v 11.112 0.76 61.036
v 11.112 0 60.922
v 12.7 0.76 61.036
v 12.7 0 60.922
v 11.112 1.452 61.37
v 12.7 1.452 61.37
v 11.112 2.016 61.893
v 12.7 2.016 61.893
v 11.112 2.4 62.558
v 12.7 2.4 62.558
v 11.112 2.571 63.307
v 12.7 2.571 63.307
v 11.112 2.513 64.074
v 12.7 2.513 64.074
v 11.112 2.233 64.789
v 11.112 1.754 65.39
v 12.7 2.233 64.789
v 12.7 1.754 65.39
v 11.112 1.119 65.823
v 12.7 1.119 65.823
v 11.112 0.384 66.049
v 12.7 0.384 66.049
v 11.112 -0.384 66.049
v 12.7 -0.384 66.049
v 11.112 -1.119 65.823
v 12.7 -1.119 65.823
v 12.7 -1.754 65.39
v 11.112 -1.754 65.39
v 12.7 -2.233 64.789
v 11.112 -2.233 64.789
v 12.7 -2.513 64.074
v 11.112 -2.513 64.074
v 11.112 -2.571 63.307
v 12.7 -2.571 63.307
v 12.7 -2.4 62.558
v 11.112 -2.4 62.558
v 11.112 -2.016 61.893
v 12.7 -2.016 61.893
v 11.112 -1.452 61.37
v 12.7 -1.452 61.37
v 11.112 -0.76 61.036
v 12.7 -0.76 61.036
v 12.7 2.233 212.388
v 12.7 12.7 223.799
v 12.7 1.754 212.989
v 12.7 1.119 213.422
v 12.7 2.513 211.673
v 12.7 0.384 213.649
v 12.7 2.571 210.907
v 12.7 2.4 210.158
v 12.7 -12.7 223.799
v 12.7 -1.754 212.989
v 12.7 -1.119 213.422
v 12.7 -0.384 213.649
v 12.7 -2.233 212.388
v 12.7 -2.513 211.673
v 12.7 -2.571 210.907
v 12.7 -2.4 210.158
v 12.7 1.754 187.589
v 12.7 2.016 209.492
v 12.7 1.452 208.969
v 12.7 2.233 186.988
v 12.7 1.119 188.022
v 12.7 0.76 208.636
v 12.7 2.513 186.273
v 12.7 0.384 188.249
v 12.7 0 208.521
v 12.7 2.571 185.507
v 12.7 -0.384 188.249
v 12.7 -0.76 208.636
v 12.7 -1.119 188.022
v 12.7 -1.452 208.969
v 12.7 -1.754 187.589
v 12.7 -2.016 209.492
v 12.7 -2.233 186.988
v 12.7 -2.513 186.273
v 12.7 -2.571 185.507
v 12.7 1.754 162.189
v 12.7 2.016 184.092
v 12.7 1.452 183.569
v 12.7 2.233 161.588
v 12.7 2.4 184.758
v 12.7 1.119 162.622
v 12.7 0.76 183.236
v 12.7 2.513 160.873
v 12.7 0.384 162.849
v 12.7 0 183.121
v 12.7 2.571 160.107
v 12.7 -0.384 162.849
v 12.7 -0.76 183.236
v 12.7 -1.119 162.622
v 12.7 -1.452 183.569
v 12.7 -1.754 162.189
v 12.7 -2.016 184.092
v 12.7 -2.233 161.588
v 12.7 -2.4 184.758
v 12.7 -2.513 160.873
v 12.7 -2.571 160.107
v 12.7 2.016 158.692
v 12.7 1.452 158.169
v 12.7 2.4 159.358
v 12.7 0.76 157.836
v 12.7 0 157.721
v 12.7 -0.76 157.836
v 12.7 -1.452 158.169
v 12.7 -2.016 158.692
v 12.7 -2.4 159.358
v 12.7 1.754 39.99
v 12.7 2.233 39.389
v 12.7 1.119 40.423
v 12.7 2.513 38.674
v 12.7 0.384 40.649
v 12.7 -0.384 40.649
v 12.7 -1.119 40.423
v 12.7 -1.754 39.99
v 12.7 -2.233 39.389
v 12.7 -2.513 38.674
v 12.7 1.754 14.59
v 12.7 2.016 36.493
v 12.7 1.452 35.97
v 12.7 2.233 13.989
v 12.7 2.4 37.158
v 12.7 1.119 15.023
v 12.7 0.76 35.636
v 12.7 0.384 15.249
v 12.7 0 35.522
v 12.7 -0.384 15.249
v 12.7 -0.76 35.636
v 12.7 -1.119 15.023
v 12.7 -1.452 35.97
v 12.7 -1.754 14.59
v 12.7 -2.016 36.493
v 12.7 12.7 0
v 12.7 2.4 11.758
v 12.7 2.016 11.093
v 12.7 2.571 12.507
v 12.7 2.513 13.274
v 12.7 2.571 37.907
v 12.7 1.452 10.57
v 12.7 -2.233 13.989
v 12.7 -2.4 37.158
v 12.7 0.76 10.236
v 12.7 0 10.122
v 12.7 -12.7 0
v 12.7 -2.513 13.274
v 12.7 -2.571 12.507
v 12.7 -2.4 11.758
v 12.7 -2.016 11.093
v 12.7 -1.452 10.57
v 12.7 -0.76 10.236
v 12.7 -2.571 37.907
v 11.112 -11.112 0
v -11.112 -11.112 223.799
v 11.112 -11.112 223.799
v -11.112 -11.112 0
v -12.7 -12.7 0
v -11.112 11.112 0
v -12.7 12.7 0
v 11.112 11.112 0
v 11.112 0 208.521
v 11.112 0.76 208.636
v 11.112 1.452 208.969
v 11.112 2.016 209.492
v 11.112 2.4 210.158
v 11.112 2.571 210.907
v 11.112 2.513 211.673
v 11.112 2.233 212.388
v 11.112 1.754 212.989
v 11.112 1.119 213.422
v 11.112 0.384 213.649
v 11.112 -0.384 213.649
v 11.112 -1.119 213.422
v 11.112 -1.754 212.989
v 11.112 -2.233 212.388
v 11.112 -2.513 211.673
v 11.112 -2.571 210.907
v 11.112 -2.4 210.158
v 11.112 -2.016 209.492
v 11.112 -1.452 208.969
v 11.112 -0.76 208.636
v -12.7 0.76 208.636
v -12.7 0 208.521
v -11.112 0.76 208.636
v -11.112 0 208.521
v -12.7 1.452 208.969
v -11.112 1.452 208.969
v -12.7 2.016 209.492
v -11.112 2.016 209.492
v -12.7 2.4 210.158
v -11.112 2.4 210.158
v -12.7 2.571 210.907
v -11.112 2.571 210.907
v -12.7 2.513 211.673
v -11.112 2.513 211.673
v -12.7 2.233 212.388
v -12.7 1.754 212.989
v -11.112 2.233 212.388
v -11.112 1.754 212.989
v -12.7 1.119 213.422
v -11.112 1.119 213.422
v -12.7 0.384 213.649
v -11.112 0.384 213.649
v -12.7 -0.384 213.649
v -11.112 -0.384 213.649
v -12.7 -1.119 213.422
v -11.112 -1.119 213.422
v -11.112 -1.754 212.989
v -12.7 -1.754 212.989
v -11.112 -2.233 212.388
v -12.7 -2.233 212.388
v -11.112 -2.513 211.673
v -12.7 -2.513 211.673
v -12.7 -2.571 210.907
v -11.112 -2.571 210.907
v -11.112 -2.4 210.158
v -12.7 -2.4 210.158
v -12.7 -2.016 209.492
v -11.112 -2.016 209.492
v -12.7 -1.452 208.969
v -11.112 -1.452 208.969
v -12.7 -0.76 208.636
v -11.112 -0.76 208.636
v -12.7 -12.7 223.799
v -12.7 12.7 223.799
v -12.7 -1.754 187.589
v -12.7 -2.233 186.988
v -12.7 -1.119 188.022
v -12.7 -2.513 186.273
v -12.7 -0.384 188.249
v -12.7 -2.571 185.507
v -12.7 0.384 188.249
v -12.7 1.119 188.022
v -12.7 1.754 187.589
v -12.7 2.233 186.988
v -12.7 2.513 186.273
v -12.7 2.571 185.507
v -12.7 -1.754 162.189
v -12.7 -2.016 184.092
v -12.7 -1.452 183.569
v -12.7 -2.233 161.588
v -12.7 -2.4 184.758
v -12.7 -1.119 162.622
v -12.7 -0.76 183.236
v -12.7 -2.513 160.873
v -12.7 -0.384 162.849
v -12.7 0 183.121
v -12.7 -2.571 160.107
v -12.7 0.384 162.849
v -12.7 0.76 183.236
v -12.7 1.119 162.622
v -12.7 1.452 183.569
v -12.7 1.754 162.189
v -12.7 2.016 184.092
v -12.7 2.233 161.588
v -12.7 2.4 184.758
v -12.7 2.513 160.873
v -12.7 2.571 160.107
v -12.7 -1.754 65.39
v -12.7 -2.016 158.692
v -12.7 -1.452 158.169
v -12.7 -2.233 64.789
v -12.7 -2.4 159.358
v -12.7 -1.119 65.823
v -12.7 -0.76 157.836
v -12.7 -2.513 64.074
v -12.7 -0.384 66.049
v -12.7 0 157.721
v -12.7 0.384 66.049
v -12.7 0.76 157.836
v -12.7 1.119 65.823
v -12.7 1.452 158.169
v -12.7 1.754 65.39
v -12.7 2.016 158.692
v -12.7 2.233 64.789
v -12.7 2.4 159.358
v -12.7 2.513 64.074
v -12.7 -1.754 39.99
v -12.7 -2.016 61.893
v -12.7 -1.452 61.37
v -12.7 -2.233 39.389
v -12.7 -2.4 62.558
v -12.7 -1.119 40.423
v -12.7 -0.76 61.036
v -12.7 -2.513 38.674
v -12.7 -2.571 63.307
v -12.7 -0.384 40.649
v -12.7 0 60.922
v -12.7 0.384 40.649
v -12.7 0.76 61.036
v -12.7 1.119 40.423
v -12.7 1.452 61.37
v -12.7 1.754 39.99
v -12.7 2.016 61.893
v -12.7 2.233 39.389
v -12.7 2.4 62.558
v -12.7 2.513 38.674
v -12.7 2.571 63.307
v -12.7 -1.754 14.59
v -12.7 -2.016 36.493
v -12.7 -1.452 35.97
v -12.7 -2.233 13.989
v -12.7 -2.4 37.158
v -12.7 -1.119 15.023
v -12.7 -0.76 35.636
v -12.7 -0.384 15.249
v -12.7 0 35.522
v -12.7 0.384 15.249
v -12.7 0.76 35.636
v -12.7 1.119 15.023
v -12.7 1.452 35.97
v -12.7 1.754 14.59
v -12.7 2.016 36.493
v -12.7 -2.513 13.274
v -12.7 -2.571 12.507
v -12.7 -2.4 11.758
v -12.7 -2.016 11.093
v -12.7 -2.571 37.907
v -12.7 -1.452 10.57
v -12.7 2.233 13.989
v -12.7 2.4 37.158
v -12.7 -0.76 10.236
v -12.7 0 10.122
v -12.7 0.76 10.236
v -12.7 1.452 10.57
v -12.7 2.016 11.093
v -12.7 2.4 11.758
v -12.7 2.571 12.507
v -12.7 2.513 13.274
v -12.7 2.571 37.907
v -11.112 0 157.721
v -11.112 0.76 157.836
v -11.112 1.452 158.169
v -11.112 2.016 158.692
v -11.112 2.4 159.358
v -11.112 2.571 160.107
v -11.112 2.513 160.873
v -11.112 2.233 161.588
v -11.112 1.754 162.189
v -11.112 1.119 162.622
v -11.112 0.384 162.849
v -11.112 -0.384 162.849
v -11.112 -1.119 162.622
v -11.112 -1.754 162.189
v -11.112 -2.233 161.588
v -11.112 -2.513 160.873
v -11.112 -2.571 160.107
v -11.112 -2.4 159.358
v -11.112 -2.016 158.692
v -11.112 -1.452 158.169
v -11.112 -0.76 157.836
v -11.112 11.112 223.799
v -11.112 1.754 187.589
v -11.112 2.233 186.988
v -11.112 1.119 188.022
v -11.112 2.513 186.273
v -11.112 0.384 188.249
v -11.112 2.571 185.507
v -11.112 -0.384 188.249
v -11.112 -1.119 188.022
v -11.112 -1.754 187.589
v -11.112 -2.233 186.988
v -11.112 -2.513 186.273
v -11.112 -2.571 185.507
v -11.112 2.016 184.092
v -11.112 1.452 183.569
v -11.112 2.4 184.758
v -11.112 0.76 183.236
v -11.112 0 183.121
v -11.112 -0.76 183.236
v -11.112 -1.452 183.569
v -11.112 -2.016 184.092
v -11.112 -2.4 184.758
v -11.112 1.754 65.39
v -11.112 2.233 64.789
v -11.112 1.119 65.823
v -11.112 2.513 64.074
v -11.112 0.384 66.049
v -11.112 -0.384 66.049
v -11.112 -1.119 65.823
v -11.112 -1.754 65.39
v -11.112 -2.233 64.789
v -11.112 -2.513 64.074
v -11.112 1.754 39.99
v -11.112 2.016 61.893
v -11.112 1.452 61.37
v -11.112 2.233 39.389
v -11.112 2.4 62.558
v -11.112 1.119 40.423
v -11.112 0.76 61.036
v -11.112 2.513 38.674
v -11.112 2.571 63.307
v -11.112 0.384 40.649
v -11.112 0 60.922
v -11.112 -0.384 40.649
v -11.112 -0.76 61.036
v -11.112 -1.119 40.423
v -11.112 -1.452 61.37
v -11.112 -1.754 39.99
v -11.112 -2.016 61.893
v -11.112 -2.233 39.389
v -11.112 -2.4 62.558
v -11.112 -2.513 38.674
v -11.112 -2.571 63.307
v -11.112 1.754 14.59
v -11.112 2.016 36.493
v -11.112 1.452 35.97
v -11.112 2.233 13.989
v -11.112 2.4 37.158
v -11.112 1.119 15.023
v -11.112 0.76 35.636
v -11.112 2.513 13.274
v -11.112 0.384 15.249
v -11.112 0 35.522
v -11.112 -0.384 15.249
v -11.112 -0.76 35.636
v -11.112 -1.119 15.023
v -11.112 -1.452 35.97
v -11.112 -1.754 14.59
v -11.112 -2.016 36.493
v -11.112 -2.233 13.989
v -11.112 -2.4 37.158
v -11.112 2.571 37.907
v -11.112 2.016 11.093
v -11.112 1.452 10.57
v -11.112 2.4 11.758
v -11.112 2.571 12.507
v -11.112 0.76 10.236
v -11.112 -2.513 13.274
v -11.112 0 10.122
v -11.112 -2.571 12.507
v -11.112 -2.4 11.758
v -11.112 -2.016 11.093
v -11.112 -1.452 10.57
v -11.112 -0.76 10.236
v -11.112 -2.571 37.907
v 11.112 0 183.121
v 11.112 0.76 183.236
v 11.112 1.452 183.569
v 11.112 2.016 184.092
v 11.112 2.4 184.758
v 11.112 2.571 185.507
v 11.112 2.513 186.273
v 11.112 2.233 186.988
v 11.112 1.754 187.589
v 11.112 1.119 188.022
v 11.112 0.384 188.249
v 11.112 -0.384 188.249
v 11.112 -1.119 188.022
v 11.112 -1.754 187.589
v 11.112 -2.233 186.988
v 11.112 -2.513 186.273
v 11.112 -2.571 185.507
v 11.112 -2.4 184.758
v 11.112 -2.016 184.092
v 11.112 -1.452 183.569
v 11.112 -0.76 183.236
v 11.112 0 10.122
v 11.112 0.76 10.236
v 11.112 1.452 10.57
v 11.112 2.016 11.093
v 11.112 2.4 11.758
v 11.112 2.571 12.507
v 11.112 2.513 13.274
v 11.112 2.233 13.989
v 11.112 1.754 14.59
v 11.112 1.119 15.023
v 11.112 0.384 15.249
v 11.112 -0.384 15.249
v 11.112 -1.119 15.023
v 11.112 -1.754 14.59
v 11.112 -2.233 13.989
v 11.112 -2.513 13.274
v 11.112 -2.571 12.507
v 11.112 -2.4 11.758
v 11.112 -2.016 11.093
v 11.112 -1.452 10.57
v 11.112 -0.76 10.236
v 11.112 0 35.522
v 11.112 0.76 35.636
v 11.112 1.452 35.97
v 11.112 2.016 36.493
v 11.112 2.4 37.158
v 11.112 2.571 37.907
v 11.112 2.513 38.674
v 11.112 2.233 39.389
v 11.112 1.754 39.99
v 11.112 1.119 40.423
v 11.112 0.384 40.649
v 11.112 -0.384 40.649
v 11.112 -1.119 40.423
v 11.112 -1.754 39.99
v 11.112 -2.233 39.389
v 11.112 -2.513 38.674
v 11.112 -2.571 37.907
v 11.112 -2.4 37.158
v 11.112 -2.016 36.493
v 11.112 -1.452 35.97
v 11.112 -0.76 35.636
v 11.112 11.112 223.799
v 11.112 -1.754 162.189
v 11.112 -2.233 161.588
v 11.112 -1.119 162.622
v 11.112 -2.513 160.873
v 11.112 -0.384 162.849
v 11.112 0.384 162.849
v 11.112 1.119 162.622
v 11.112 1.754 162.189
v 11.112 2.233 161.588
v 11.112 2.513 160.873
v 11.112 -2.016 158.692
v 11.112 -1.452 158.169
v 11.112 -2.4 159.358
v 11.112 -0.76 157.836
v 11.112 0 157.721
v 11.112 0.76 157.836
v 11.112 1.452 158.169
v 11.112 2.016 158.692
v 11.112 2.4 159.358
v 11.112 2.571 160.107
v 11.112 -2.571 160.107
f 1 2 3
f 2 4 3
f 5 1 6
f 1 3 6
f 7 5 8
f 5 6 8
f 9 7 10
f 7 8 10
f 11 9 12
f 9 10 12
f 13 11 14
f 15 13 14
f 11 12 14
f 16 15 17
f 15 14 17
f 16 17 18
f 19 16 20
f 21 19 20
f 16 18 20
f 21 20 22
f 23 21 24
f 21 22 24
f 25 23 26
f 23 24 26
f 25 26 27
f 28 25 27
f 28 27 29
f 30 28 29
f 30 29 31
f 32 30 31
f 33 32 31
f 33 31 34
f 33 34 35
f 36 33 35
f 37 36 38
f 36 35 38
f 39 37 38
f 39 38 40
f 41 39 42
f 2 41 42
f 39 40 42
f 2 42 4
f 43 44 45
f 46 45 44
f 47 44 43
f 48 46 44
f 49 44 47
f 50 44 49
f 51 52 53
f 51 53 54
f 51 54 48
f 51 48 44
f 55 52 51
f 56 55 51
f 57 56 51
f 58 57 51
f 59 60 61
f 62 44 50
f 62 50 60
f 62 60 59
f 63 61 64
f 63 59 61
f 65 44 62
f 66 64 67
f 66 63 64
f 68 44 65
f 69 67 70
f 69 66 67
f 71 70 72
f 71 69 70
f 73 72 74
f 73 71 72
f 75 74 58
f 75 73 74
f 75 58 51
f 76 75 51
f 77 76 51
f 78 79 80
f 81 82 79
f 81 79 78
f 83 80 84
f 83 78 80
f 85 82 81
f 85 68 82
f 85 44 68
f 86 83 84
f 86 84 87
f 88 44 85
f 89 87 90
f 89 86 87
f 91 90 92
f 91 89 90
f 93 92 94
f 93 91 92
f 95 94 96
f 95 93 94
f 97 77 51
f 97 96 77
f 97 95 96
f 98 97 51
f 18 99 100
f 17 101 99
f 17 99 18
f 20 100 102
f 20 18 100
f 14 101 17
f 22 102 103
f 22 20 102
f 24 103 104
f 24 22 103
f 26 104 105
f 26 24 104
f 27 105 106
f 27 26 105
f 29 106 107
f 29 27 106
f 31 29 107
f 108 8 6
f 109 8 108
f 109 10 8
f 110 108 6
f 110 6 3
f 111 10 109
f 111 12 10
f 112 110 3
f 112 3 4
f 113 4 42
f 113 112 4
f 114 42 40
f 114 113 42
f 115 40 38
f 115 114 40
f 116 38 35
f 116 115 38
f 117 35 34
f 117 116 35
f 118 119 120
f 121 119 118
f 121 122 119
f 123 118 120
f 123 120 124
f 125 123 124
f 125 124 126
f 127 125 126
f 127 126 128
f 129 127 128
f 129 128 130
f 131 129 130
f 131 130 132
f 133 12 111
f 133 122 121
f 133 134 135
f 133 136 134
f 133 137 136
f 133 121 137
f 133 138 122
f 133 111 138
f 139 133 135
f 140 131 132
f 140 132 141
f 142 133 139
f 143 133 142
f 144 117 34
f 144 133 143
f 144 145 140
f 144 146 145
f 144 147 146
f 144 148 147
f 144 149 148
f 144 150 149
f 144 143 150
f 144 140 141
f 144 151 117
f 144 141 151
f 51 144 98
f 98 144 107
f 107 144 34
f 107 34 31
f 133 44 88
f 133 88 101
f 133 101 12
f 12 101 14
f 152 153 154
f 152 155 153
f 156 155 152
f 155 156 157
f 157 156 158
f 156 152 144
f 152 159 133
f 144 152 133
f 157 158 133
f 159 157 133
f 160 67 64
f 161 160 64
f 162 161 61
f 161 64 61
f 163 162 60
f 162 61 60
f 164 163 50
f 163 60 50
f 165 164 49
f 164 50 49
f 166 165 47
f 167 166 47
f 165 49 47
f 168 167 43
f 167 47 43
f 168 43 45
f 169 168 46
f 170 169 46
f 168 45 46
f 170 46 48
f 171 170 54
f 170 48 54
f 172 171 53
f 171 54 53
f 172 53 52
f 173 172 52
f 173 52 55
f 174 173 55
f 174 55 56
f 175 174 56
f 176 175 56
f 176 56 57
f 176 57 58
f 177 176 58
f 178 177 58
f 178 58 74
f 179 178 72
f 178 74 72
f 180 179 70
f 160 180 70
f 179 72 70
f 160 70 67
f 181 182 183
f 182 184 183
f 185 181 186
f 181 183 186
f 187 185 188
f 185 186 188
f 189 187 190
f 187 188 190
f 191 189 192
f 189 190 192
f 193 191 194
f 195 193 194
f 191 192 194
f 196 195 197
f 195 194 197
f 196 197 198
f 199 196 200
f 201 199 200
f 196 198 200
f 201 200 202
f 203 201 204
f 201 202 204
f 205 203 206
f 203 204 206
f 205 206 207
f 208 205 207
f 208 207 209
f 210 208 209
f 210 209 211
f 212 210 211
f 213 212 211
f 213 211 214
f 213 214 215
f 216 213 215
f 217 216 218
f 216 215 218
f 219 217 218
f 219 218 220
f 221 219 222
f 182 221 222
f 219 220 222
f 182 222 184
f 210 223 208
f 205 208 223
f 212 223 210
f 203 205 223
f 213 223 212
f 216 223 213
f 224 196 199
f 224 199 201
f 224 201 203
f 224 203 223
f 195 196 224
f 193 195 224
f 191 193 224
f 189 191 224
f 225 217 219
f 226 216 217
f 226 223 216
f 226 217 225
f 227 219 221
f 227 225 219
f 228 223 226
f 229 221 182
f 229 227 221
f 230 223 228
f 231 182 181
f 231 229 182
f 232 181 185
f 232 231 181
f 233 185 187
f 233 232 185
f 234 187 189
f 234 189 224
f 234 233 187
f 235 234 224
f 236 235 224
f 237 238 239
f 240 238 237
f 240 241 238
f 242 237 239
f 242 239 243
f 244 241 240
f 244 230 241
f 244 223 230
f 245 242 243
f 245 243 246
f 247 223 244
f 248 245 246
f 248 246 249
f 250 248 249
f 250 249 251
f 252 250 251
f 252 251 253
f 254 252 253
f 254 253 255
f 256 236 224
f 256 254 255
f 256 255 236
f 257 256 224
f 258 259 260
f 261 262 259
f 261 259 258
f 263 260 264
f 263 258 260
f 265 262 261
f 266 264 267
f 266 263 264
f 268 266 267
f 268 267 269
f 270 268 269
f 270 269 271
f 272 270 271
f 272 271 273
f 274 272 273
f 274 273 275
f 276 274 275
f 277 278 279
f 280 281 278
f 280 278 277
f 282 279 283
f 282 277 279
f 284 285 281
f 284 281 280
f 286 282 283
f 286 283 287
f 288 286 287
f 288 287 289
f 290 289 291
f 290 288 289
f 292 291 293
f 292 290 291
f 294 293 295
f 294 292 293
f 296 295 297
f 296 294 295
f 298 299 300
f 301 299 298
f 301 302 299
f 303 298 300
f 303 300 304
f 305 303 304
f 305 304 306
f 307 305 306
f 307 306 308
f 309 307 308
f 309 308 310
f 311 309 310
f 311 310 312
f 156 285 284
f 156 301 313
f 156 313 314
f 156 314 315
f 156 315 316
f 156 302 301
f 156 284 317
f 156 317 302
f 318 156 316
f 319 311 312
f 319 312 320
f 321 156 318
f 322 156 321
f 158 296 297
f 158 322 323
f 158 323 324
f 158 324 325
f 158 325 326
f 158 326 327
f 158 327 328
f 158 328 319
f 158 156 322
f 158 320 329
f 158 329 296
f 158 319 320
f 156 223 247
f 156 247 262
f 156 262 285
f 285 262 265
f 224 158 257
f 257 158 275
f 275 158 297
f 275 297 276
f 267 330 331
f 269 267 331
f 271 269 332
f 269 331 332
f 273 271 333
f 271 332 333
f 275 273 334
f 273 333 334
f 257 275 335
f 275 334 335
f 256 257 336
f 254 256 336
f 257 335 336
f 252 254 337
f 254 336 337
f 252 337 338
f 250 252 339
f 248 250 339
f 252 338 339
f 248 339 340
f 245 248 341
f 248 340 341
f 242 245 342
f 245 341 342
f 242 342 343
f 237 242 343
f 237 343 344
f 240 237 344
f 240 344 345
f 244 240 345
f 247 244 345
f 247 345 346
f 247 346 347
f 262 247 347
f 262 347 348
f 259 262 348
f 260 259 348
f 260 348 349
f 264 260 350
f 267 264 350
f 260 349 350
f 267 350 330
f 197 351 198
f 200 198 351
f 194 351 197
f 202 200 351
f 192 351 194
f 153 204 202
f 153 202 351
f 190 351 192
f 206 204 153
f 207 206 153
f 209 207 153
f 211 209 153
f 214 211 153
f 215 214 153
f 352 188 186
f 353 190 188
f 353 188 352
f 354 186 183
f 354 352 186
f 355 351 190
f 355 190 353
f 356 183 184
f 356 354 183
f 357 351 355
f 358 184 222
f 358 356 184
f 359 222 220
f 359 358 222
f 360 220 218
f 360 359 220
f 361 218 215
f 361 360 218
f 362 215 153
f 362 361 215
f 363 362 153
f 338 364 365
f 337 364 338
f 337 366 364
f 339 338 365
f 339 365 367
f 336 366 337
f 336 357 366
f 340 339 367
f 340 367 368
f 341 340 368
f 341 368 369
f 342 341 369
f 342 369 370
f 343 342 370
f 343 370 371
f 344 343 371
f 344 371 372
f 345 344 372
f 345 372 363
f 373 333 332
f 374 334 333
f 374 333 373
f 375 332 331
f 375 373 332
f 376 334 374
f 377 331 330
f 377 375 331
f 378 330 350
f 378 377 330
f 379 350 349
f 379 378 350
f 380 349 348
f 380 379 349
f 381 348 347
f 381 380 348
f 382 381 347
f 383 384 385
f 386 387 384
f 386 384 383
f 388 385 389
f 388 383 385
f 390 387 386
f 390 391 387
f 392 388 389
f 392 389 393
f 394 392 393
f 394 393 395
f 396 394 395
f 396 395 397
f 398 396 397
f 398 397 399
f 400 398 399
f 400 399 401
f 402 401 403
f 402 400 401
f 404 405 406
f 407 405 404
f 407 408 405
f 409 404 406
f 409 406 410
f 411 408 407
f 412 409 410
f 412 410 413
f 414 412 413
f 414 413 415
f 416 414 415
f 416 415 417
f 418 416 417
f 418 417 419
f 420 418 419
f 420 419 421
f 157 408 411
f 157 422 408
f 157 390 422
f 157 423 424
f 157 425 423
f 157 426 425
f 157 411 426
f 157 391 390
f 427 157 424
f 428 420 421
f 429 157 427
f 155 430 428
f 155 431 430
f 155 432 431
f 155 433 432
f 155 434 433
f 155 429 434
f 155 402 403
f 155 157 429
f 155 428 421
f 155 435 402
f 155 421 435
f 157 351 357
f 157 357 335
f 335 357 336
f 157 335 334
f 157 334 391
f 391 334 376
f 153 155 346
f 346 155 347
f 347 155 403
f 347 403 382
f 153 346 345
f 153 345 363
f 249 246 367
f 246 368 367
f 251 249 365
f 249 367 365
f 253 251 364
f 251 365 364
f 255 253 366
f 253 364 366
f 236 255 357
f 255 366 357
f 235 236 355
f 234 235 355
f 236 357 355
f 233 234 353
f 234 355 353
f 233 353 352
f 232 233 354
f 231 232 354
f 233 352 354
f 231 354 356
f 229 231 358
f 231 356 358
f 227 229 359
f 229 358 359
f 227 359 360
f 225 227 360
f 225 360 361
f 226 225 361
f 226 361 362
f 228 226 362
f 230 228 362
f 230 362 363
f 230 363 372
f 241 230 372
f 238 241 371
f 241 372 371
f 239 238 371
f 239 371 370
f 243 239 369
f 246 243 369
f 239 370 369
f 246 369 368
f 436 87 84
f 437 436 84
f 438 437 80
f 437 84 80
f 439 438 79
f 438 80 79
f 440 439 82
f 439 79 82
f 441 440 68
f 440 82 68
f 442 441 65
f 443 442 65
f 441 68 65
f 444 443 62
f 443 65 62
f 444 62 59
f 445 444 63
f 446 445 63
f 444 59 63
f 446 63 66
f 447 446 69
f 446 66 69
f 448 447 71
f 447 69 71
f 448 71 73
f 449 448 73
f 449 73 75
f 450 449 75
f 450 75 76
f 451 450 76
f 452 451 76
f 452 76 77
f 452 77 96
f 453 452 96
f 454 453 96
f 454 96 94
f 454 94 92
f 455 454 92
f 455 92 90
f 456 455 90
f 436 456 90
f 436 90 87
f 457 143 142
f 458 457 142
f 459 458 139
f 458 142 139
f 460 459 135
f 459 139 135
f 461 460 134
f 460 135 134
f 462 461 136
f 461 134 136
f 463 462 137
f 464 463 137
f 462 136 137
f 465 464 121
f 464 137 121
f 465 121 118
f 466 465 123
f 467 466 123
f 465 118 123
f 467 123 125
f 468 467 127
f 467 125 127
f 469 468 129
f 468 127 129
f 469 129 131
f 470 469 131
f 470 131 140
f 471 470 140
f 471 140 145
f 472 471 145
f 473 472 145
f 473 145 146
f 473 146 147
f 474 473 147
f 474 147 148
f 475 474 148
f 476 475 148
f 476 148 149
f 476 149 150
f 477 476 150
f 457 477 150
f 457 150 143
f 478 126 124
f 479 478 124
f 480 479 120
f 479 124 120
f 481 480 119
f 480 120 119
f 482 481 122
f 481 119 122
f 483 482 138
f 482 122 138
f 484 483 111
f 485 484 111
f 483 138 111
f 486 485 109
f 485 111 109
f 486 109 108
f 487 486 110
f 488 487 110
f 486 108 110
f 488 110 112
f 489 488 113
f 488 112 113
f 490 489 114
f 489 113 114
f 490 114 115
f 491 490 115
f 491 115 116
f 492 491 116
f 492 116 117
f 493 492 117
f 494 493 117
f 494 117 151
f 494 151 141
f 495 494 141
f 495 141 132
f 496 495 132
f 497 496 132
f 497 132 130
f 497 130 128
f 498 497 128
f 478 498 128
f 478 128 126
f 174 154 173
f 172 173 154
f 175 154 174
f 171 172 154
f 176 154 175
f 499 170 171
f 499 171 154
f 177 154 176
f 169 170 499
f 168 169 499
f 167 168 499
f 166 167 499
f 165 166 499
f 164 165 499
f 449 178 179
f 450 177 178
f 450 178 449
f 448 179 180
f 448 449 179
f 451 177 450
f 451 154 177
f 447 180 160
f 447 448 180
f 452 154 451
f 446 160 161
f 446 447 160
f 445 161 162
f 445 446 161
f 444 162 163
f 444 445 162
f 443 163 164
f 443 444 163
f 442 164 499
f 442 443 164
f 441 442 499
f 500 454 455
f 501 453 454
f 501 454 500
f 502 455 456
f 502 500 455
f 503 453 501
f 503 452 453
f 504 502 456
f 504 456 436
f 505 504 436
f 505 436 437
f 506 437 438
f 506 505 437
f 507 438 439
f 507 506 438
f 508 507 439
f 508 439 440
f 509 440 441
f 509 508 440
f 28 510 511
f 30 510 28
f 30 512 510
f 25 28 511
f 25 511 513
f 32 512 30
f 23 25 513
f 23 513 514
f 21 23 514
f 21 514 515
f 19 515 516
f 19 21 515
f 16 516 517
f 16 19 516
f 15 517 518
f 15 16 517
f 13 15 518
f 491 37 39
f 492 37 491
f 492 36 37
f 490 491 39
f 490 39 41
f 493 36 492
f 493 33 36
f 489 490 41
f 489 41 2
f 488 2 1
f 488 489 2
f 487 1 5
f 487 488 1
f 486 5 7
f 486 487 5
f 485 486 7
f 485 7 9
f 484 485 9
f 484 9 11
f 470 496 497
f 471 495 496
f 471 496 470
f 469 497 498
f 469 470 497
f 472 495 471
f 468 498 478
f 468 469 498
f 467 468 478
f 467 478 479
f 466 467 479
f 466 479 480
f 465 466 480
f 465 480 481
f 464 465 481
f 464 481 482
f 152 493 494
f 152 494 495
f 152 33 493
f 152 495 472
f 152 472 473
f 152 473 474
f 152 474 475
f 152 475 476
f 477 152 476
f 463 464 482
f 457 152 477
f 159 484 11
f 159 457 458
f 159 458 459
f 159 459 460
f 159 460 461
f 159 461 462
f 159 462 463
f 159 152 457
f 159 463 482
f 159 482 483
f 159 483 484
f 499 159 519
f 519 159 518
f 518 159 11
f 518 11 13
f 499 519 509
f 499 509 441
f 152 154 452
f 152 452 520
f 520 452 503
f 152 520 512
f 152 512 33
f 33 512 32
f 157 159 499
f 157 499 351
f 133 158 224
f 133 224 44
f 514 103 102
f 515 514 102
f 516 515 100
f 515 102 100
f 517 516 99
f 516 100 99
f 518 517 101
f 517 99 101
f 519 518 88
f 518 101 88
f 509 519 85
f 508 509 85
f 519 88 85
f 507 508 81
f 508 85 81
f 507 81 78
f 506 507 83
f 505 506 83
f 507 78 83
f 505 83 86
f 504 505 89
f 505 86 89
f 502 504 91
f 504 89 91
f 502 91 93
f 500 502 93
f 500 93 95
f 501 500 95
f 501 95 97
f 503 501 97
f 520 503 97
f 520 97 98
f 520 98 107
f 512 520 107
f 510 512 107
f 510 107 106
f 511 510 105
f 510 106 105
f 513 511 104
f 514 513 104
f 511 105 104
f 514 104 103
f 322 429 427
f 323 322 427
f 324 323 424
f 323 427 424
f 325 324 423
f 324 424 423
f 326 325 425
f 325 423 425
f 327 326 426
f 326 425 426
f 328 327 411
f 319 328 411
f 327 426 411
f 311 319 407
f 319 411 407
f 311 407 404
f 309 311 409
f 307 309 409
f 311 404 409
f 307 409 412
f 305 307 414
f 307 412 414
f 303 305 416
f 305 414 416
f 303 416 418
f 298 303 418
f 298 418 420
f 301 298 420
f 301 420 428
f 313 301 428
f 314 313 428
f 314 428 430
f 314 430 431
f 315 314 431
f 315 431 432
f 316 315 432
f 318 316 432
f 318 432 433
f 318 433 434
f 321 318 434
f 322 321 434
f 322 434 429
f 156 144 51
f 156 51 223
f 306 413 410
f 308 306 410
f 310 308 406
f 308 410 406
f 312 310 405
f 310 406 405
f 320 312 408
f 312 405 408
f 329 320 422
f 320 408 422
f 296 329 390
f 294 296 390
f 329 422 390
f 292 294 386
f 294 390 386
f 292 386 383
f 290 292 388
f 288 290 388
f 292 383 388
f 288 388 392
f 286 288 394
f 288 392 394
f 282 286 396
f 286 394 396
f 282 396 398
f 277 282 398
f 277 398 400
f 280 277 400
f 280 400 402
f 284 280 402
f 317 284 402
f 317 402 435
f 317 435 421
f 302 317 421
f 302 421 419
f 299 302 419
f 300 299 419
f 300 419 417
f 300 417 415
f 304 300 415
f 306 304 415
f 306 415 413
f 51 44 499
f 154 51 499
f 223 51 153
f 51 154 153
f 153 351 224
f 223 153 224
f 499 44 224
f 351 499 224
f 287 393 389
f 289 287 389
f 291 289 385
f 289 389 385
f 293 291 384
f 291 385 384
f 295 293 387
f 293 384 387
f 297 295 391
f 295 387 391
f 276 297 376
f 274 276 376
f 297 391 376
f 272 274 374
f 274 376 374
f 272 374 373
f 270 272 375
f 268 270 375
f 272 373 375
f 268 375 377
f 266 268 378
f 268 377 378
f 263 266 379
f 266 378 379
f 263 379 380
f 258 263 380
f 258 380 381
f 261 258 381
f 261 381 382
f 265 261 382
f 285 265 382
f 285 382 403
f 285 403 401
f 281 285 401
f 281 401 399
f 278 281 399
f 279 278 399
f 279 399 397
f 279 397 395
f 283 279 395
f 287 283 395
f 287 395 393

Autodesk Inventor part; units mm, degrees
ref_plane "YZ Plane" through (0, 0, 0) normal (1, 0, 0) x (0, 1, 0)
ref_plane "XZ Plane" through (0, 0, 0) normal (0, 1, 0) x (-1, 0, 0)
ref_plane "XY Plane" through (0, 0, 0) normal (0, 0, 1) x (1, 0, 0)
sketch "Sketch1" plane through (0, 0, 0) normal (0, 0, 1) x (1, 0, 0)
  line L0 (-12.7, -12.7) -> (-12.7, 12.7)
  line L1 (-12.7, 12.7) -> (12.7, 12.7)
  line L2 (12.7, 12.7) -> (12.7, -12.7)
  line L3 (12.7, -12.7) -> (-12.7, -12.7)
  line L4 (-12.7, -12.7) -> (12.7, 12.7) construction
  line L5 (-12.7, 12.7) -> (12.7, -12.7) construction
  line L6 (11.1125, 11.1125) -> (-11.1125, 11.1125)
  line L7 (-11.1125, 11.1125) -> (-11.1125, -11.1125)
  line L8 (-11.1125, -11.1125) -> (11.1125, -11.1125)
  line L9 (11.1125, -11.1125) -> (11.1125, 11.1125)
  point P0 (0, 0)
  dimension "d0" = 25.4
  dimension "d1" = 25.4
  dimension "d2" = 1.5875
extrude "Extrusion1" add sketch "Sketch1" along normal blind 609.6
sketch "Sketch2" plane through (12.7, -12.7, 0) normal (1, 0, 0) x (0, 0, -1)
  line L0 (0, 0) -> (0, 25.4) projected
  line L1 (0, 25.4) -> (-609.6, 25.4) projected
  line L2 (-609.6, 0) -> (-609.6, 25.4) projected
  line L3 (0, 0) -> (-609.6, 0) projected
  circle A0 centre (-596.9, 12.7) radius 2.5781
  circle A1 centre (-571.5, 12.7) radius 2.5781
  circle A2 centre (-546.1, 12.7) radius 2.5781
  line L4 (-304.8, 0) -> (-304.8, 25.4) construction
  circle A3 centre (-12.7, 12.7) radius 2.5781
  circle A4 centre (-38.1, 12.7) radius 2.5781
  circle A5 centre (-63.5, 12.7) radius 2.5781
  point P0 (0, 12.7)
  dimension "d5" = 5.1562
  dimension "d7" = 12.7
  dimension "d8" = 25.4
  dimension "d9" = 25.4
extrude "Extrusion2" cut sketch "Sketch2" against normal through all contours A0 | A1 | A2 | A3 | A4 | A5
sketch "Sketch5" plane through (-12.7, 12.7, 0) normal (0, 1, 0) x (1, 0, 0)
  line L0 (25.4, 0) -> (25.4, -609.6) projected
  line L1 (25.4, 0) -> (25.4, -223.7994)
  line L2 (25.4, -223.7994) -> (-0.9, -223.7994)
  line L3 (-0.9, -223.7994) -> (-0.9, -681.5571)
  line L4 (-0.9, -681.5571) -> (85.6151, -690.7866)
  line L5 (85.6151, -690.7866) -> (25.4, -223.7994)
  point P0 (12.7, 0)
  dimension "d15" = 223.7994
extrude "Extrusion4" cut sketch "Sketch5" against normal blind 101.6
sketch "Sketch6" plane through (12.7, -12.7, 0) normal (1, 0, 0) x (0, 0, -1)
  line L0 (-223.7994, 1.5875) -> (-223.7994, 23.8125) projected
  line L1 (-223.7994, 12.7) -> (-211.0994, 12.7)
  circle A0 centre (-211.0994, 12.7) radius 2.5781
  line L2 (-211.0994, 12.7) -> (-185.6994, 12.7)
  circle A1 centre (-185.6994, 12.7) radius 2.5781
  line L3 (-185.6994, 12.7) -> (-160.2994, 12.7)
  circle A2 centre (-160.2994, 12.7) radius 2.5781
  point P0 (0, 12.7)
  dimension "d18" = 12.7
  dimension "d19" = 5.1562
  dimension "d20" = 25.4
  dimension "d21" = 5.1562
  dimension "d22" = 25.4
  dimension "d23" = 5.1562
extrude "Extrusion5" cut sketch "Sketch6" against normal blind 50.8
equation "\"d1\" = d0"
properties part number "24in long 1in square tube"
